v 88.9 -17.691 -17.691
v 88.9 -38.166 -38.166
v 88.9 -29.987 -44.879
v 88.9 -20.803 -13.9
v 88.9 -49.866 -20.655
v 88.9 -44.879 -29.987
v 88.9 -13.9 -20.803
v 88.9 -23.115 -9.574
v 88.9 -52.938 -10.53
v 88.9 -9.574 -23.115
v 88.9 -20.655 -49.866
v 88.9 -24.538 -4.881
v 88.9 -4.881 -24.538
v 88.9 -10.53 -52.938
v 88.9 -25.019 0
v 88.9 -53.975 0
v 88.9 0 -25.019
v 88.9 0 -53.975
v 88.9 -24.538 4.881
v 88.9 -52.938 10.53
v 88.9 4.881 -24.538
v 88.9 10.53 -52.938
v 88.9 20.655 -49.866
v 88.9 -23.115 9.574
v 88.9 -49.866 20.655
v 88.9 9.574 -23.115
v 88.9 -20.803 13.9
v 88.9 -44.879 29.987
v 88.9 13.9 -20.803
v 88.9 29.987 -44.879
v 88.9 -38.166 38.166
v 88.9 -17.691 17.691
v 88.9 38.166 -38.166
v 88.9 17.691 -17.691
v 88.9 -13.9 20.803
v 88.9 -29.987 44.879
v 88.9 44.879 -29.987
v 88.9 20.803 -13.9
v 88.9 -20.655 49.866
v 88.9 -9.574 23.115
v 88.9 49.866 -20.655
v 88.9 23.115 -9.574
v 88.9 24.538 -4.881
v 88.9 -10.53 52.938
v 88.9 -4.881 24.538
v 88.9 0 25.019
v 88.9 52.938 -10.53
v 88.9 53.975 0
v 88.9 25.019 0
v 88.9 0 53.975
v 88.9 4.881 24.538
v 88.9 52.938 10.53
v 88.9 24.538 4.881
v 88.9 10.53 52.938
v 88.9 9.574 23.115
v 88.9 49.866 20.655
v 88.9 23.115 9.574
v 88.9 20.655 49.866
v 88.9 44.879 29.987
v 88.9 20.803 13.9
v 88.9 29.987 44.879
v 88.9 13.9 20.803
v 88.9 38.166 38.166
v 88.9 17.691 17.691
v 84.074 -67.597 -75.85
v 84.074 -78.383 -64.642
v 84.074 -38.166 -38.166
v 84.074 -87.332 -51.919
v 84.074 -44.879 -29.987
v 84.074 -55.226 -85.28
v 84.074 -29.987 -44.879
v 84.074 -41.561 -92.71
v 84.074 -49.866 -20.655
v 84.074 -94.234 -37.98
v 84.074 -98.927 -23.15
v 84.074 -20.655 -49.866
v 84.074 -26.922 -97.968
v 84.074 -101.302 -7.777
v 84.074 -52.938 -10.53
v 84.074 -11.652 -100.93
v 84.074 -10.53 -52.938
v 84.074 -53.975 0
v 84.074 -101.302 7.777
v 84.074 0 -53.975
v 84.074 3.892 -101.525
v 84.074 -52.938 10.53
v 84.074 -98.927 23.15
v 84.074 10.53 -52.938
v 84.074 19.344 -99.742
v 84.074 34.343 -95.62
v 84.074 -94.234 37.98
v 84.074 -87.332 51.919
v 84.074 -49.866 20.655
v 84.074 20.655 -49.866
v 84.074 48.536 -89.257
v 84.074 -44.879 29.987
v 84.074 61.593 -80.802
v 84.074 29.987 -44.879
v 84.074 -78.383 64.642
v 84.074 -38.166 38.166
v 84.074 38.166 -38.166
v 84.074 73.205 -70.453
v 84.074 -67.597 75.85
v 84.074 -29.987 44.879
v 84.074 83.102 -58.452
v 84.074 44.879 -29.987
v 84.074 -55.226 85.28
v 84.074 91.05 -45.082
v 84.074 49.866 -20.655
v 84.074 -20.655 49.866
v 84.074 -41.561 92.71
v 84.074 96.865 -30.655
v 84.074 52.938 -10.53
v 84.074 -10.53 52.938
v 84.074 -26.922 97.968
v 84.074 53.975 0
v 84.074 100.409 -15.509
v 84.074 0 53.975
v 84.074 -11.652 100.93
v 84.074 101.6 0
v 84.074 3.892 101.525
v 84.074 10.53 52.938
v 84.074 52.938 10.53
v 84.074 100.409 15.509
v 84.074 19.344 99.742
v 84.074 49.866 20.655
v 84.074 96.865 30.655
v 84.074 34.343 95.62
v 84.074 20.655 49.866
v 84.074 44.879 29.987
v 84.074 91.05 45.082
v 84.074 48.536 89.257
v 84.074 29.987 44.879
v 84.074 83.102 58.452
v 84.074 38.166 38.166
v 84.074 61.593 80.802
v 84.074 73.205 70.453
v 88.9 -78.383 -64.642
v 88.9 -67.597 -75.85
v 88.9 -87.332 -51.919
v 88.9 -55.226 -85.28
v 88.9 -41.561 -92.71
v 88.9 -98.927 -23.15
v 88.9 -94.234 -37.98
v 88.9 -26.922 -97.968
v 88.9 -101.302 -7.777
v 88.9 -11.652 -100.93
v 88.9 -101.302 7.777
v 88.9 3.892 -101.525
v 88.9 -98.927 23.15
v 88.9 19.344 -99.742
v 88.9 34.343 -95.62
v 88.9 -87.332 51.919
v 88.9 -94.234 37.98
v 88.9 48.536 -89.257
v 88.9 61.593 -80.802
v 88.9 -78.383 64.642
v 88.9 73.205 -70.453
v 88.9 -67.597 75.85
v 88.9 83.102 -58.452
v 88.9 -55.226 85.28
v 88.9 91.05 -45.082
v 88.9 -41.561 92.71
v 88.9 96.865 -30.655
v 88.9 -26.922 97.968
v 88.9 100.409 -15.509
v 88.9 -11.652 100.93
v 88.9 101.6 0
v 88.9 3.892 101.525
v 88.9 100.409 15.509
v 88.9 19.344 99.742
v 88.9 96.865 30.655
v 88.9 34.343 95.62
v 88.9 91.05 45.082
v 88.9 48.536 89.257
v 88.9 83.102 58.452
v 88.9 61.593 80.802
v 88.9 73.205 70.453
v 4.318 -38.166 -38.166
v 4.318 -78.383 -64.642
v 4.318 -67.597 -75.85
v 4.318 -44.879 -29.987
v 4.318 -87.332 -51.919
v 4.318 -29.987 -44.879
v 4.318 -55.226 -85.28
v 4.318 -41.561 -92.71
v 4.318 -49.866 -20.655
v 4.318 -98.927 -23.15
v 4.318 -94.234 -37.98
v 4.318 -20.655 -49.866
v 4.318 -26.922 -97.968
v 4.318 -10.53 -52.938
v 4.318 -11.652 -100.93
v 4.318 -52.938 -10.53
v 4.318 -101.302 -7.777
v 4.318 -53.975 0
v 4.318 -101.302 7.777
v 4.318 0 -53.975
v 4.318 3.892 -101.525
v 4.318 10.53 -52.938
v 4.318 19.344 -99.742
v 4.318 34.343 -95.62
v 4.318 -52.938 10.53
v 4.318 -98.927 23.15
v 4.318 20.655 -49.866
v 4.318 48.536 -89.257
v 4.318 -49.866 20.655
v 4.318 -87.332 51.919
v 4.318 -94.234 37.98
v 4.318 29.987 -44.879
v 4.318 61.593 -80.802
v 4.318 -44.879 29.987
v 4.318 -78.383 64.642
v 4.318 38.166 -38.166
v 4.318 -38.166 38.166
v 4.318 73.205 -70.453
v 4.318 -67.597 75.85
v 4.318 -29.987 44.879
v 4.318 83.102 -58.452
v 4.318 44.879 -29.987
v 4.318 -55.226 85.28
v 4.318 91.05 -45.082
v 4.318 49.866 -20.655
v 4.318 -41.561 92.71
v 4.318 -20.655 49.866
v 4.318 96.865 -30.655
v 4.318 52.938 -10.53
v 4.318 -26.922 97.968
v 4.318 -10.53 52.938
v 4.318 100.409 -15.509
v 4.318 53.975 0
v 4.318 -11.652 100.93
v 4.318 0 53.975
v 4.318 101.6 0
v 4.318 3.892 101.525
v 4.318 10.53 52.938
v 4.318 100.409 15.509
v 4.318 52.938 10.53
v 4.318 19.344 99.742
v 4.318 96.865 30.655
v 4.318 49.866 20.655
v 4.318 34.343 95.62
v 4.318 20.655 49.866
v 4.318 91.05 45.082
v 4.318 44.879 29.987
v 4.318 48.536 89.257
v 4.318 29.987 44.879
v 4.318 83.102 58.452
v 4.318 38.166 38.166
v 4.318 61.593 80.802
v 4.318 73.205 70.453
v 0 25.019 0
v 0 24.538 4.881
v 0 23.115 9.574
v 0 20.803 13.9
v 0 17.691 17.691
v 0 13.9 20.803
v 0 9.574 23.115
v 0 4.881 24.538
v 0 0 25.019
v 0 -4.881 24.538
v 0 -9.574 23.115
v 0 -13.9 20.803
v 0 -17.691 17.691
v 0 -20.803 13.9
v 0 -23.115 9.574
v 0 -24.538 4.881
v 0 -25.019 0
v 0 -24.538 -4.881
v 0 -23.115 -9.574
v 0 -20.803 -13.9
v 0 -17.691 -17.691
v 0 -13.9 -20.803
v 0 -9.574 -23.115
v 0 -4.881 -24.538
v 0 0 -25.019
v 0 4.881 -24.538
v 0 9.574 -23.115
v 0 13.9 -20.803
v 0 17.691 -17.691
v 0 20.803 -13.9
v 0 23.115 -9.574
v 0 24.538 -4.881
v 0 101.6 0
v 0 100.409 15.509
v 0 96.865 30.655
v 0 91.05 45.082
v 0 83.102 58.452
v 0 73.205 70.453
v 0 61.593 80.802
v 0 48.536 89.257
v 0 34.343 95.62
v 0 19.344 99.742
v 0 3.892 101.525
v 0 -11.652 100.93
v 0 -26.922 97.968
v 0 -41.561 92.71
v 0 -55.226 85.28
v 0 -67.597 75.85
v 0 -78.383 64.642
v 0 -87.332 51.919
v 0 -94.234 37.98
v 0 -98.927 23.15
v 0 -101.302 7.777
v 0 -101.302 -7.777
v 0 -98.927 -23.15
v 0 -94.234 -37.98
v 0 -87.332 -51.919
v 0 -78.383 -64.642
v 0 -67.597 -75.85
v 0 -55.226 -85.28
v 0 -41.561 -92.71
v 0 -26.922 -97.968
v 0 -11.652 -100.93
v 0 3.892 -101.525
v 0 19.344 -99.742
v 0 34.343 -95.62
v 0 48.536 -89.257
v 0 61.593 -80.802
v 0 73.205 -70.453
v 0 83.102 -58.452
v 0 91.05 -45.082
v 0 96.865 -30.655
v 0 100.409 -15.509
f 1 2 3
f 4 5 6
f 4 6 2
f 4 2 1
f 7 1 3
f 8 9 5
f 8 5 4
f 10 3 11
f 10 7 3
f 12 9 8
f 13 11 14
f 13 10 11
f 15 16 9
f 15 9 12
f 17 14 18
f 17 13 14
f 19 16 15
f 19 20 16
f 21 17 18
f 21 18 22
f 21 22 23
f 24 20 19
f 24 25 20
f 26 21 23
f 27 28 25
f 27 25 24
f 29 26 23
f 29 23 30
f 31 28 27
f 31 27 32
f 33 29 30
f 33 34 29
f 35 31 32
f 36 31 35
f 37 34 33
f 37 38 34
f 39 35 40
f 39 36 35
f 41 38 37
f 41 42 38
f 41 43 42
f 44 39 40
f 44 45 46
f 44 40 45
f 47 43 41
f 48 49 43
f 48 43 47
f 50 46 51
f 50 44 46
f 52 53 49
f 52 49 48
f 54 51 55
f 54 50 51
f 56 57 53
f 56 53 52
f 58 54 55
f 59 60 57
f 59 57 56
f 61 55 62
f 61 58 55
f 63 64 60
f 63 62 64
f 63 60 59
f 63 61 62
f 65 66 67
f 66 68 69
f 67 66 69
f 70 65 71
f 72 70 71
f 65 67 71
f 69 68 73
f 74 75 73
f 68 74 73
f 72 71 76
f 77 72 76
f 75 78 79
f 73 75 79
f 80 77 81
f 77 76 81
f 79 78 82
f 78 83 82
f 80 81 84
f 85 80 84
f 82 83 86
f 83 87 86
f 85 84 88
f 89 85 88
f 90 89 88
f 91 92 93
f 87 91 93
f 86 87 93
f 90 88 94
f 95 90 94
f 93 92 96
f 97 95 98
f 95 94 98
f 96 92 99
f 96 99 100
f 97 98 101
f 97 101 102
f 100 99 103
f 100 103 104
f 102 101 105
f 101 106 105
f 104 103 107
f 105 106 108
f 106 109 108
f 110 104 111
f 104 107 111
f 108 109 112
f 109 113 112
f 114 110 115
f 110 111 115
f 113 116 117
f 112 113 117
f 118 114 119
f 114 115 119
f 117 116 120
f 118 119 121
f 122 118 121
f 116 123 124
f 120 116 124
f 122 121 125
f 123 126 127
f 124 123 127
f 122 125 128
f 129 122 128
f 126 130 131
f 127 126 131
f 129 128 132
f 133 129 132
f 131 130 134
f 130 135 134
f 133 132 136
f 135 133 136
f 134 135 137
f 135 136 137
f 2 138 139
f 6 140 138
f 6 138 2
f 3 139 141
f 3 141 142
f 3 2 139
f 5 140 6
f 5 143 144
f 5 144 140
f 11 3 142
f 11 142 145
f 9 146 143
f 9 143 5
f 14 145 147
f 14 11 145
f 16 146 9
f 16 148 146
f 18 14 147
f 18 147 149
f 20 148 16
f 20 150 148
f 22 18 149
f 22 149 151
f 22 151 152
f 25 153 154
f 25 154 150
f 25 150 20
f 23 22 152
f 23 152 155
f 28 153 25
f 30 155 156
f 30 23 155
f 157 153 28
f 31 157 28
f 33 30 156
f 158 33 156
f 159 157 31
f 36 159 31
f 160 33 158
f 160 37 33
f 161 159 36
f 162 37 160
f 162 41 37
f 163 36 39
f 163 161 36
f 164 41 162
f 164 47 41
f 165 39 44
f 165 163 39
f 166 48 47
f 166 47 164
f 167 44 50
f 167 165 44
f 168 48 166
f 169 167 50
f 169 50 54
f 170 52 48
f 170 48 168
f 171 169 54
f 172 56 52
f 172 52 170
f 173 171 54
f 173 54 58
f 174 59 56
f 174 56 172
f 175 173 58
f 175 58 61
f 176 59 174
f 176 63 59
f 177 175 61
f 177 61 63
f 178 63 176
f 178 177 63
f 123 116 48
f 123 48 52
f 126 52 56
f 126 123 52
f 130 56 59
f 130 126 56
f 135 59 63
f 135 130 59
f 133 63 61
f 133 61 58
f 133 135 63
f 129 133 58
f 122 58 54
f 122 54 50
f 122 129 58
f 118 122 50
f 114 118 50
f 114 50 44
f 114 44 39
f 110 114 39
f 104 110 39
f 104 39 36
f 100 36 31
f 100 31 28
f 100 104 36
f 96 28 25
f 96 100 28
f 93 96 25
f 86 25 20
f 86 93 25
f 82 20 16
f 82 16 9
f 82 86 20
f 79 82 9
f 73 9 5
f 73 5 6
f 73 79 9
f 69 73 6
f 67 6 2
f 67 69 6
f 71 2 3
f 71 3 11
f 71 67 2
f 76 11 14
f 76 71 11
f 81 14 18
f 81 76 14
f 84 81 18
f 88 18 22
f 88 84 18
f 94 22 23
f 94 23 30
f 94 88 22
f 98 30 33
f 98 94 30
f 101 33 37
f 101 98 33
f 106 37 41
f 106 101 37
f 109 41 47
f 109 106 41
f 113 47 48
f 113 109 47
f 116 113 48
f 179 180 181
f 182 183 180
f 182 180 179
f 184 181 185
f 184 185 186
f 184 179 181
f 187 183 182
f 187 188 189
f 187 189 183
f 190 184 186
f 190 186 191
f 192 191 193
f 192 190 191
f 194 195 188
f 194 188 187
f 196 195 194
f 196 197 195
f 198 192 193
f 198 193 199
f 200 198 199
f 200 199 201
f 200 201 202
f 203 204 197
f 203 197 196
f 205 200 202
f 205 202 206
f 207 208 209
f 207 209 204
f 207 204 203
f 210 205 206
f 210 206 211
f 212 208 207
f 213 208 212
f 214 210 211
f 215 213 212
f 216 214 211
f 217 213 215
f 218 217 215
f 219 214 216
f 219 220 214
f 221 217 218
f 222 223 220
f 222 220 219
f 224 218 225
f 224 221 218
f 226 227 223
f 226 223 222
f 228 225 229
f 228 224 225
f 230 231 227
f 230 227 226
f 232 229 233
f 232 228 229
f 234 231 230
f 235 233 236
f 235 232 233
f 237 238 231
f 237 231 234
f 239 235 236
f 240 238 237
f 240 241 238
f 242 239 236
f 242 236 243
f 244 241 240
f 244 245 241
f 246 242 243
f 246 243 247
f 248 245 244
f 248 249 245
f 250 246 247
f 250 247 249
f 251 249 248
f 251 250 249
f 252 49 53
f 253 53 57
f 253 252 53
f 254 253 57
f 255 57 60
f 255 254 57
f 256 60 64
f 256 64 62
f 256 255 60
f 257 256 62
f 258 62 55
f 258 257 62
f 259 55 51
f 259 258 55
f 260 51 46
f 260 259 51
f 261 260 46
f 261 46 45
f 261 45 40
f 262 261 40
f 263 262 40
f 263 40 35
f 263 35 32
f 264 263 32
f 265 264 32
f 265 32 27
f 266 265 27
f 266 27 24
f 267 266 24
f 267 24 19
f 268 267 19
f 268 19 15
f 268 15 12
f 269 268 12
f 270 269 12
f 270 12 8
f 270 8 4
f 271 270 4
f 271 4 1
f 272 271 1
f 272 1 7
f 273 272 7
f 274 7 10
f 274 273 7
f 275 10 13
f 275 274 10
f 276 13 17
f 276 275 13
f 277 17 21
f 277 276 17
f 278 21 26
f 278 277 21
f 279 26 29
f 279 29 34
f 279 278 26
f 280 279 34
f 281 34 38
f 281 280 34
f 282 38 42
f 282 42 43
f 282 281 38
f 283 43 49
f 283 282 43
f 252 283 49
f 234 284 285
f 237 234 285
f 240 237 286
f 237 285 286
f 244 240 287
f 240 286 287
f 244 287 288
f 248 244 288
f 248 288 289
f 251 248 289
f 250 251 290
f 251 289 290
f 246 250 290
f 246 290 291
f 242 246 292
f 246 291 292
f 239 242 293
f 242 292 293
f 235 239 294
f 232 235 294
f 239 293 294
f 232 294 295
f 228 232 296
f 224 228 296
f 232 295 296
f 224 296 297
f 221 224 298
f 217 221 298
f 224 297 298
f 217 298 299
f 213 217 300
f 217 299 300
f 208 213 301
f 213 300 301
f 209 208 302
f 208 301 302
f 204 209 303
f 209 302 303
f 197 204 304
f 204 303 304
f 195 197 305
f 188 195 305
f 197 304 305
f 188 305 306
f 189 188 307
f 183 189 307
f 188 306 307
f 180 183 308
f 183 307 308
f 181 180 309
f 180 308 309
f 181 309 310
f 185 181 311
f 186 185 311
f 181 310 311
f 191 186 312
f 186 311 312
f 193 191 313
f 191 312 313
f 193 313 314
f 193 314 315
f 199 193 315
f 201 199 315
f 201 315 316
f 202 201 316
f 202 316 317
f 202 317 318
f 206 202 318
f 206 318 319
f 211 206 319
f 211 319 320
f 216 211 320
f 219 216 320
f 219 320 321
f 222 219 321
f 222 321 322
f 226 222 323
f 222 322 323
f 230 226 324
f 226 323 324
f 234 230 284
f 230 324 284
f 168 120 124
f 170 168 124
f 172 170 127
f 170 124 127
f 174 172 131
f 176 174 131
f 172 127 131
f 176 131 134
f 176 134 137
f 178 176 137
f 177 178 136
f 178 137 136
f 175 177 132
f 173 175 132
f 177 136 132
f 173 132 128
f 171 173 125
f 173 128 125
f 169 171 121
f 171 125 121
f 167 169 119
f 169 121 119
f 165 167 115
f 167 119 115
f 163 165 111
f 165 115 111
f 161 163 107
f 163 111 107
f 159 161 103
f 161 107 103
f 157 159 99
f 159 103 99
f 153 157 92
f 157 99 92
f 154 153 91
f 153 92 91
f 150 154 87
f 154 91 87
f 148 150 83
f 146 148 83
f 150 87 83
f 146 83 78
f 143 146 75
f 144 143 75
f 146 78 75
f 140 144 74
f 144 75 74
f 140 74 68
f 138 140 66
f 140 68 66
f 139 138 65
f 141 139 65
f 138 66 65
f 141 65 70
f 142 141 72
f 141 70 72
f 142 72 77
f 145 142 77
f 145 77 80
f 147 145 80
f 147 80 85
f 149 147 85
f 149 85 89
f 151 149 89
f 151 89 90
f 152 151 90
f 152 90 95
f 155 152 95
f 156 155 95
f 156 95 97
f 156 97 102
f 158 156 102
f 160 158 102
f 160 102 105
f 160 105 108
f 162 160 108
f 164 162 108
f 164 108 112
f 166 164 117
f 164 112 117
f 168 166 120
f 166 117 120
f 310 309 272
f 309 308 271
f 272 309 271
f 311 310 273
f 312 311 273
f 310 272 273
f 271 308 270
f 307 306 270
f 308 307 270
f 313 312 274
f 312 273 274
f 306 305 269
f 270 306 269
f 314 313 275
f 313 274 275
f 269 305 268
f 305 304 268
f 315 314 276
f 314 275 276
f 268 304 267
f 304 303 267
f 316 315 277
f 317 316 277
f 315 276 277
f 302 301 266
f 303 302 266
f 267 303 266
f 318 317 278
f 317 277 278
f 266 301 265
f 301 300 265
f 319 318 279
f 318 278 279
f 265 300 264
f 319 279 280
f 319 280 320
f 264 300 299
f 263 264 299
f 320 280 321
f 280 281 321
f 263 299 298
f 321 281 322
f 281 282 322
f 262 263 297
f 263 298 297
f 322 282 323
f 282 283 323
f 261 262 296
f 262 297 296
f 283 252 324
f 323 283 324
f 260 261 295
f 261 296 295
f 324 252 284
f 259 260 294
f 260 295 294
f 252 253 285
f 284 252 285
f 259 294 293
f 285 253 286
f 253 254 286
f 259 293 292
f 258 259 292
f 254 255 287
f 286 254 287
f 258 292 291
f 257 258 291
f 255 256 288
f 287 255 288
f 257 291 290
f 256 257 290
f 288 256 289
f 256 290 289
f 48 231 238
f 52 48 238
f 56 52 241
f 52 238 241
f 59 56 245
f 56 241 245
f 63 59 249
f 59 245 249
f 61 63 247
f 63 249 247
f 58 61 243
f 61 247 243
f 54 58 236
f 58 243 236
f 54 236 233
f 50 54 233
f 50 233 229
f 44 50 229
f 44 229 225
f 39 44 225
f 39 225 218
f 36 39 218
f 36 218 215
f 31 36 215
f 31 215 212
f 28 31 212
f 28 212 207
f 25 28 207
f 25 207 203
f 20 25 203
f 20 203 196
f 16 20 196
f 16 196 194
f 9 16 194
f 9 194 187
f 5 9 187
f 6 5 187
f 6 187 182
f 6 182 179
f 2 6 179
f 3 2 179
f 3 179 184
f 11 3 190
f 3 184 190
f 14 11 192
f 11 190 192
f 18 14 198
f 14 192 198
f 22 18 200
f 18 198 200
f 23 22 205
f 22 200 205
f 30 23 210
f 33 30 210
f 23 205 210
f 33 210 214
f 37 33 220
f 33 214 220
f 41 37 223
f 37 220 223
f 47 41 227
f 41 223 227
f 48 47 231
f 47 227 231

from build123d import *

# Parameters (mm, degrees)
F0_R     = 101.6
F0_R_2   = 53.975
F0_R_3   = 25.019
F1_DEPTH = 4.318
F2_DEPTH = 88.9
F3_START = 84.074
F3_DEPTH = 4.826


with BuildPart() as f1:
    # F0 (on Right) → F1 (new body)
    with BuildSketch(Plane.YZ):
        Circle(F0_R)
        Circle(F0_R_2, mode=Mode.SUBTRACT)
        Circle(F0_R_2)
        Circle(F0_R_3, mode=Mode.SUBTRACT)
    extrude(amount=F1_DEPTH)

    # F0 (on Right) → F2 (join)
    with BuildSketch(Plane.YZ):
        Circle(F0_R_2)
        Circle(F0_R_3, mode=Mode.SUBTRACT)
    extrude(amount=F2_DEPTH)


with BuildPart() as f3:
    # F0 (on Right) → F3 (new body)
    with BuildSketch(Plane.YZ.offset(F3_START)):
        Circle(F0_R)
        Circle(F0_R_2, mode=Mode.SUBTRACT)
    extrude(amount=F3_DEPTH)


solid = Compound([f1.part, f3.part])
